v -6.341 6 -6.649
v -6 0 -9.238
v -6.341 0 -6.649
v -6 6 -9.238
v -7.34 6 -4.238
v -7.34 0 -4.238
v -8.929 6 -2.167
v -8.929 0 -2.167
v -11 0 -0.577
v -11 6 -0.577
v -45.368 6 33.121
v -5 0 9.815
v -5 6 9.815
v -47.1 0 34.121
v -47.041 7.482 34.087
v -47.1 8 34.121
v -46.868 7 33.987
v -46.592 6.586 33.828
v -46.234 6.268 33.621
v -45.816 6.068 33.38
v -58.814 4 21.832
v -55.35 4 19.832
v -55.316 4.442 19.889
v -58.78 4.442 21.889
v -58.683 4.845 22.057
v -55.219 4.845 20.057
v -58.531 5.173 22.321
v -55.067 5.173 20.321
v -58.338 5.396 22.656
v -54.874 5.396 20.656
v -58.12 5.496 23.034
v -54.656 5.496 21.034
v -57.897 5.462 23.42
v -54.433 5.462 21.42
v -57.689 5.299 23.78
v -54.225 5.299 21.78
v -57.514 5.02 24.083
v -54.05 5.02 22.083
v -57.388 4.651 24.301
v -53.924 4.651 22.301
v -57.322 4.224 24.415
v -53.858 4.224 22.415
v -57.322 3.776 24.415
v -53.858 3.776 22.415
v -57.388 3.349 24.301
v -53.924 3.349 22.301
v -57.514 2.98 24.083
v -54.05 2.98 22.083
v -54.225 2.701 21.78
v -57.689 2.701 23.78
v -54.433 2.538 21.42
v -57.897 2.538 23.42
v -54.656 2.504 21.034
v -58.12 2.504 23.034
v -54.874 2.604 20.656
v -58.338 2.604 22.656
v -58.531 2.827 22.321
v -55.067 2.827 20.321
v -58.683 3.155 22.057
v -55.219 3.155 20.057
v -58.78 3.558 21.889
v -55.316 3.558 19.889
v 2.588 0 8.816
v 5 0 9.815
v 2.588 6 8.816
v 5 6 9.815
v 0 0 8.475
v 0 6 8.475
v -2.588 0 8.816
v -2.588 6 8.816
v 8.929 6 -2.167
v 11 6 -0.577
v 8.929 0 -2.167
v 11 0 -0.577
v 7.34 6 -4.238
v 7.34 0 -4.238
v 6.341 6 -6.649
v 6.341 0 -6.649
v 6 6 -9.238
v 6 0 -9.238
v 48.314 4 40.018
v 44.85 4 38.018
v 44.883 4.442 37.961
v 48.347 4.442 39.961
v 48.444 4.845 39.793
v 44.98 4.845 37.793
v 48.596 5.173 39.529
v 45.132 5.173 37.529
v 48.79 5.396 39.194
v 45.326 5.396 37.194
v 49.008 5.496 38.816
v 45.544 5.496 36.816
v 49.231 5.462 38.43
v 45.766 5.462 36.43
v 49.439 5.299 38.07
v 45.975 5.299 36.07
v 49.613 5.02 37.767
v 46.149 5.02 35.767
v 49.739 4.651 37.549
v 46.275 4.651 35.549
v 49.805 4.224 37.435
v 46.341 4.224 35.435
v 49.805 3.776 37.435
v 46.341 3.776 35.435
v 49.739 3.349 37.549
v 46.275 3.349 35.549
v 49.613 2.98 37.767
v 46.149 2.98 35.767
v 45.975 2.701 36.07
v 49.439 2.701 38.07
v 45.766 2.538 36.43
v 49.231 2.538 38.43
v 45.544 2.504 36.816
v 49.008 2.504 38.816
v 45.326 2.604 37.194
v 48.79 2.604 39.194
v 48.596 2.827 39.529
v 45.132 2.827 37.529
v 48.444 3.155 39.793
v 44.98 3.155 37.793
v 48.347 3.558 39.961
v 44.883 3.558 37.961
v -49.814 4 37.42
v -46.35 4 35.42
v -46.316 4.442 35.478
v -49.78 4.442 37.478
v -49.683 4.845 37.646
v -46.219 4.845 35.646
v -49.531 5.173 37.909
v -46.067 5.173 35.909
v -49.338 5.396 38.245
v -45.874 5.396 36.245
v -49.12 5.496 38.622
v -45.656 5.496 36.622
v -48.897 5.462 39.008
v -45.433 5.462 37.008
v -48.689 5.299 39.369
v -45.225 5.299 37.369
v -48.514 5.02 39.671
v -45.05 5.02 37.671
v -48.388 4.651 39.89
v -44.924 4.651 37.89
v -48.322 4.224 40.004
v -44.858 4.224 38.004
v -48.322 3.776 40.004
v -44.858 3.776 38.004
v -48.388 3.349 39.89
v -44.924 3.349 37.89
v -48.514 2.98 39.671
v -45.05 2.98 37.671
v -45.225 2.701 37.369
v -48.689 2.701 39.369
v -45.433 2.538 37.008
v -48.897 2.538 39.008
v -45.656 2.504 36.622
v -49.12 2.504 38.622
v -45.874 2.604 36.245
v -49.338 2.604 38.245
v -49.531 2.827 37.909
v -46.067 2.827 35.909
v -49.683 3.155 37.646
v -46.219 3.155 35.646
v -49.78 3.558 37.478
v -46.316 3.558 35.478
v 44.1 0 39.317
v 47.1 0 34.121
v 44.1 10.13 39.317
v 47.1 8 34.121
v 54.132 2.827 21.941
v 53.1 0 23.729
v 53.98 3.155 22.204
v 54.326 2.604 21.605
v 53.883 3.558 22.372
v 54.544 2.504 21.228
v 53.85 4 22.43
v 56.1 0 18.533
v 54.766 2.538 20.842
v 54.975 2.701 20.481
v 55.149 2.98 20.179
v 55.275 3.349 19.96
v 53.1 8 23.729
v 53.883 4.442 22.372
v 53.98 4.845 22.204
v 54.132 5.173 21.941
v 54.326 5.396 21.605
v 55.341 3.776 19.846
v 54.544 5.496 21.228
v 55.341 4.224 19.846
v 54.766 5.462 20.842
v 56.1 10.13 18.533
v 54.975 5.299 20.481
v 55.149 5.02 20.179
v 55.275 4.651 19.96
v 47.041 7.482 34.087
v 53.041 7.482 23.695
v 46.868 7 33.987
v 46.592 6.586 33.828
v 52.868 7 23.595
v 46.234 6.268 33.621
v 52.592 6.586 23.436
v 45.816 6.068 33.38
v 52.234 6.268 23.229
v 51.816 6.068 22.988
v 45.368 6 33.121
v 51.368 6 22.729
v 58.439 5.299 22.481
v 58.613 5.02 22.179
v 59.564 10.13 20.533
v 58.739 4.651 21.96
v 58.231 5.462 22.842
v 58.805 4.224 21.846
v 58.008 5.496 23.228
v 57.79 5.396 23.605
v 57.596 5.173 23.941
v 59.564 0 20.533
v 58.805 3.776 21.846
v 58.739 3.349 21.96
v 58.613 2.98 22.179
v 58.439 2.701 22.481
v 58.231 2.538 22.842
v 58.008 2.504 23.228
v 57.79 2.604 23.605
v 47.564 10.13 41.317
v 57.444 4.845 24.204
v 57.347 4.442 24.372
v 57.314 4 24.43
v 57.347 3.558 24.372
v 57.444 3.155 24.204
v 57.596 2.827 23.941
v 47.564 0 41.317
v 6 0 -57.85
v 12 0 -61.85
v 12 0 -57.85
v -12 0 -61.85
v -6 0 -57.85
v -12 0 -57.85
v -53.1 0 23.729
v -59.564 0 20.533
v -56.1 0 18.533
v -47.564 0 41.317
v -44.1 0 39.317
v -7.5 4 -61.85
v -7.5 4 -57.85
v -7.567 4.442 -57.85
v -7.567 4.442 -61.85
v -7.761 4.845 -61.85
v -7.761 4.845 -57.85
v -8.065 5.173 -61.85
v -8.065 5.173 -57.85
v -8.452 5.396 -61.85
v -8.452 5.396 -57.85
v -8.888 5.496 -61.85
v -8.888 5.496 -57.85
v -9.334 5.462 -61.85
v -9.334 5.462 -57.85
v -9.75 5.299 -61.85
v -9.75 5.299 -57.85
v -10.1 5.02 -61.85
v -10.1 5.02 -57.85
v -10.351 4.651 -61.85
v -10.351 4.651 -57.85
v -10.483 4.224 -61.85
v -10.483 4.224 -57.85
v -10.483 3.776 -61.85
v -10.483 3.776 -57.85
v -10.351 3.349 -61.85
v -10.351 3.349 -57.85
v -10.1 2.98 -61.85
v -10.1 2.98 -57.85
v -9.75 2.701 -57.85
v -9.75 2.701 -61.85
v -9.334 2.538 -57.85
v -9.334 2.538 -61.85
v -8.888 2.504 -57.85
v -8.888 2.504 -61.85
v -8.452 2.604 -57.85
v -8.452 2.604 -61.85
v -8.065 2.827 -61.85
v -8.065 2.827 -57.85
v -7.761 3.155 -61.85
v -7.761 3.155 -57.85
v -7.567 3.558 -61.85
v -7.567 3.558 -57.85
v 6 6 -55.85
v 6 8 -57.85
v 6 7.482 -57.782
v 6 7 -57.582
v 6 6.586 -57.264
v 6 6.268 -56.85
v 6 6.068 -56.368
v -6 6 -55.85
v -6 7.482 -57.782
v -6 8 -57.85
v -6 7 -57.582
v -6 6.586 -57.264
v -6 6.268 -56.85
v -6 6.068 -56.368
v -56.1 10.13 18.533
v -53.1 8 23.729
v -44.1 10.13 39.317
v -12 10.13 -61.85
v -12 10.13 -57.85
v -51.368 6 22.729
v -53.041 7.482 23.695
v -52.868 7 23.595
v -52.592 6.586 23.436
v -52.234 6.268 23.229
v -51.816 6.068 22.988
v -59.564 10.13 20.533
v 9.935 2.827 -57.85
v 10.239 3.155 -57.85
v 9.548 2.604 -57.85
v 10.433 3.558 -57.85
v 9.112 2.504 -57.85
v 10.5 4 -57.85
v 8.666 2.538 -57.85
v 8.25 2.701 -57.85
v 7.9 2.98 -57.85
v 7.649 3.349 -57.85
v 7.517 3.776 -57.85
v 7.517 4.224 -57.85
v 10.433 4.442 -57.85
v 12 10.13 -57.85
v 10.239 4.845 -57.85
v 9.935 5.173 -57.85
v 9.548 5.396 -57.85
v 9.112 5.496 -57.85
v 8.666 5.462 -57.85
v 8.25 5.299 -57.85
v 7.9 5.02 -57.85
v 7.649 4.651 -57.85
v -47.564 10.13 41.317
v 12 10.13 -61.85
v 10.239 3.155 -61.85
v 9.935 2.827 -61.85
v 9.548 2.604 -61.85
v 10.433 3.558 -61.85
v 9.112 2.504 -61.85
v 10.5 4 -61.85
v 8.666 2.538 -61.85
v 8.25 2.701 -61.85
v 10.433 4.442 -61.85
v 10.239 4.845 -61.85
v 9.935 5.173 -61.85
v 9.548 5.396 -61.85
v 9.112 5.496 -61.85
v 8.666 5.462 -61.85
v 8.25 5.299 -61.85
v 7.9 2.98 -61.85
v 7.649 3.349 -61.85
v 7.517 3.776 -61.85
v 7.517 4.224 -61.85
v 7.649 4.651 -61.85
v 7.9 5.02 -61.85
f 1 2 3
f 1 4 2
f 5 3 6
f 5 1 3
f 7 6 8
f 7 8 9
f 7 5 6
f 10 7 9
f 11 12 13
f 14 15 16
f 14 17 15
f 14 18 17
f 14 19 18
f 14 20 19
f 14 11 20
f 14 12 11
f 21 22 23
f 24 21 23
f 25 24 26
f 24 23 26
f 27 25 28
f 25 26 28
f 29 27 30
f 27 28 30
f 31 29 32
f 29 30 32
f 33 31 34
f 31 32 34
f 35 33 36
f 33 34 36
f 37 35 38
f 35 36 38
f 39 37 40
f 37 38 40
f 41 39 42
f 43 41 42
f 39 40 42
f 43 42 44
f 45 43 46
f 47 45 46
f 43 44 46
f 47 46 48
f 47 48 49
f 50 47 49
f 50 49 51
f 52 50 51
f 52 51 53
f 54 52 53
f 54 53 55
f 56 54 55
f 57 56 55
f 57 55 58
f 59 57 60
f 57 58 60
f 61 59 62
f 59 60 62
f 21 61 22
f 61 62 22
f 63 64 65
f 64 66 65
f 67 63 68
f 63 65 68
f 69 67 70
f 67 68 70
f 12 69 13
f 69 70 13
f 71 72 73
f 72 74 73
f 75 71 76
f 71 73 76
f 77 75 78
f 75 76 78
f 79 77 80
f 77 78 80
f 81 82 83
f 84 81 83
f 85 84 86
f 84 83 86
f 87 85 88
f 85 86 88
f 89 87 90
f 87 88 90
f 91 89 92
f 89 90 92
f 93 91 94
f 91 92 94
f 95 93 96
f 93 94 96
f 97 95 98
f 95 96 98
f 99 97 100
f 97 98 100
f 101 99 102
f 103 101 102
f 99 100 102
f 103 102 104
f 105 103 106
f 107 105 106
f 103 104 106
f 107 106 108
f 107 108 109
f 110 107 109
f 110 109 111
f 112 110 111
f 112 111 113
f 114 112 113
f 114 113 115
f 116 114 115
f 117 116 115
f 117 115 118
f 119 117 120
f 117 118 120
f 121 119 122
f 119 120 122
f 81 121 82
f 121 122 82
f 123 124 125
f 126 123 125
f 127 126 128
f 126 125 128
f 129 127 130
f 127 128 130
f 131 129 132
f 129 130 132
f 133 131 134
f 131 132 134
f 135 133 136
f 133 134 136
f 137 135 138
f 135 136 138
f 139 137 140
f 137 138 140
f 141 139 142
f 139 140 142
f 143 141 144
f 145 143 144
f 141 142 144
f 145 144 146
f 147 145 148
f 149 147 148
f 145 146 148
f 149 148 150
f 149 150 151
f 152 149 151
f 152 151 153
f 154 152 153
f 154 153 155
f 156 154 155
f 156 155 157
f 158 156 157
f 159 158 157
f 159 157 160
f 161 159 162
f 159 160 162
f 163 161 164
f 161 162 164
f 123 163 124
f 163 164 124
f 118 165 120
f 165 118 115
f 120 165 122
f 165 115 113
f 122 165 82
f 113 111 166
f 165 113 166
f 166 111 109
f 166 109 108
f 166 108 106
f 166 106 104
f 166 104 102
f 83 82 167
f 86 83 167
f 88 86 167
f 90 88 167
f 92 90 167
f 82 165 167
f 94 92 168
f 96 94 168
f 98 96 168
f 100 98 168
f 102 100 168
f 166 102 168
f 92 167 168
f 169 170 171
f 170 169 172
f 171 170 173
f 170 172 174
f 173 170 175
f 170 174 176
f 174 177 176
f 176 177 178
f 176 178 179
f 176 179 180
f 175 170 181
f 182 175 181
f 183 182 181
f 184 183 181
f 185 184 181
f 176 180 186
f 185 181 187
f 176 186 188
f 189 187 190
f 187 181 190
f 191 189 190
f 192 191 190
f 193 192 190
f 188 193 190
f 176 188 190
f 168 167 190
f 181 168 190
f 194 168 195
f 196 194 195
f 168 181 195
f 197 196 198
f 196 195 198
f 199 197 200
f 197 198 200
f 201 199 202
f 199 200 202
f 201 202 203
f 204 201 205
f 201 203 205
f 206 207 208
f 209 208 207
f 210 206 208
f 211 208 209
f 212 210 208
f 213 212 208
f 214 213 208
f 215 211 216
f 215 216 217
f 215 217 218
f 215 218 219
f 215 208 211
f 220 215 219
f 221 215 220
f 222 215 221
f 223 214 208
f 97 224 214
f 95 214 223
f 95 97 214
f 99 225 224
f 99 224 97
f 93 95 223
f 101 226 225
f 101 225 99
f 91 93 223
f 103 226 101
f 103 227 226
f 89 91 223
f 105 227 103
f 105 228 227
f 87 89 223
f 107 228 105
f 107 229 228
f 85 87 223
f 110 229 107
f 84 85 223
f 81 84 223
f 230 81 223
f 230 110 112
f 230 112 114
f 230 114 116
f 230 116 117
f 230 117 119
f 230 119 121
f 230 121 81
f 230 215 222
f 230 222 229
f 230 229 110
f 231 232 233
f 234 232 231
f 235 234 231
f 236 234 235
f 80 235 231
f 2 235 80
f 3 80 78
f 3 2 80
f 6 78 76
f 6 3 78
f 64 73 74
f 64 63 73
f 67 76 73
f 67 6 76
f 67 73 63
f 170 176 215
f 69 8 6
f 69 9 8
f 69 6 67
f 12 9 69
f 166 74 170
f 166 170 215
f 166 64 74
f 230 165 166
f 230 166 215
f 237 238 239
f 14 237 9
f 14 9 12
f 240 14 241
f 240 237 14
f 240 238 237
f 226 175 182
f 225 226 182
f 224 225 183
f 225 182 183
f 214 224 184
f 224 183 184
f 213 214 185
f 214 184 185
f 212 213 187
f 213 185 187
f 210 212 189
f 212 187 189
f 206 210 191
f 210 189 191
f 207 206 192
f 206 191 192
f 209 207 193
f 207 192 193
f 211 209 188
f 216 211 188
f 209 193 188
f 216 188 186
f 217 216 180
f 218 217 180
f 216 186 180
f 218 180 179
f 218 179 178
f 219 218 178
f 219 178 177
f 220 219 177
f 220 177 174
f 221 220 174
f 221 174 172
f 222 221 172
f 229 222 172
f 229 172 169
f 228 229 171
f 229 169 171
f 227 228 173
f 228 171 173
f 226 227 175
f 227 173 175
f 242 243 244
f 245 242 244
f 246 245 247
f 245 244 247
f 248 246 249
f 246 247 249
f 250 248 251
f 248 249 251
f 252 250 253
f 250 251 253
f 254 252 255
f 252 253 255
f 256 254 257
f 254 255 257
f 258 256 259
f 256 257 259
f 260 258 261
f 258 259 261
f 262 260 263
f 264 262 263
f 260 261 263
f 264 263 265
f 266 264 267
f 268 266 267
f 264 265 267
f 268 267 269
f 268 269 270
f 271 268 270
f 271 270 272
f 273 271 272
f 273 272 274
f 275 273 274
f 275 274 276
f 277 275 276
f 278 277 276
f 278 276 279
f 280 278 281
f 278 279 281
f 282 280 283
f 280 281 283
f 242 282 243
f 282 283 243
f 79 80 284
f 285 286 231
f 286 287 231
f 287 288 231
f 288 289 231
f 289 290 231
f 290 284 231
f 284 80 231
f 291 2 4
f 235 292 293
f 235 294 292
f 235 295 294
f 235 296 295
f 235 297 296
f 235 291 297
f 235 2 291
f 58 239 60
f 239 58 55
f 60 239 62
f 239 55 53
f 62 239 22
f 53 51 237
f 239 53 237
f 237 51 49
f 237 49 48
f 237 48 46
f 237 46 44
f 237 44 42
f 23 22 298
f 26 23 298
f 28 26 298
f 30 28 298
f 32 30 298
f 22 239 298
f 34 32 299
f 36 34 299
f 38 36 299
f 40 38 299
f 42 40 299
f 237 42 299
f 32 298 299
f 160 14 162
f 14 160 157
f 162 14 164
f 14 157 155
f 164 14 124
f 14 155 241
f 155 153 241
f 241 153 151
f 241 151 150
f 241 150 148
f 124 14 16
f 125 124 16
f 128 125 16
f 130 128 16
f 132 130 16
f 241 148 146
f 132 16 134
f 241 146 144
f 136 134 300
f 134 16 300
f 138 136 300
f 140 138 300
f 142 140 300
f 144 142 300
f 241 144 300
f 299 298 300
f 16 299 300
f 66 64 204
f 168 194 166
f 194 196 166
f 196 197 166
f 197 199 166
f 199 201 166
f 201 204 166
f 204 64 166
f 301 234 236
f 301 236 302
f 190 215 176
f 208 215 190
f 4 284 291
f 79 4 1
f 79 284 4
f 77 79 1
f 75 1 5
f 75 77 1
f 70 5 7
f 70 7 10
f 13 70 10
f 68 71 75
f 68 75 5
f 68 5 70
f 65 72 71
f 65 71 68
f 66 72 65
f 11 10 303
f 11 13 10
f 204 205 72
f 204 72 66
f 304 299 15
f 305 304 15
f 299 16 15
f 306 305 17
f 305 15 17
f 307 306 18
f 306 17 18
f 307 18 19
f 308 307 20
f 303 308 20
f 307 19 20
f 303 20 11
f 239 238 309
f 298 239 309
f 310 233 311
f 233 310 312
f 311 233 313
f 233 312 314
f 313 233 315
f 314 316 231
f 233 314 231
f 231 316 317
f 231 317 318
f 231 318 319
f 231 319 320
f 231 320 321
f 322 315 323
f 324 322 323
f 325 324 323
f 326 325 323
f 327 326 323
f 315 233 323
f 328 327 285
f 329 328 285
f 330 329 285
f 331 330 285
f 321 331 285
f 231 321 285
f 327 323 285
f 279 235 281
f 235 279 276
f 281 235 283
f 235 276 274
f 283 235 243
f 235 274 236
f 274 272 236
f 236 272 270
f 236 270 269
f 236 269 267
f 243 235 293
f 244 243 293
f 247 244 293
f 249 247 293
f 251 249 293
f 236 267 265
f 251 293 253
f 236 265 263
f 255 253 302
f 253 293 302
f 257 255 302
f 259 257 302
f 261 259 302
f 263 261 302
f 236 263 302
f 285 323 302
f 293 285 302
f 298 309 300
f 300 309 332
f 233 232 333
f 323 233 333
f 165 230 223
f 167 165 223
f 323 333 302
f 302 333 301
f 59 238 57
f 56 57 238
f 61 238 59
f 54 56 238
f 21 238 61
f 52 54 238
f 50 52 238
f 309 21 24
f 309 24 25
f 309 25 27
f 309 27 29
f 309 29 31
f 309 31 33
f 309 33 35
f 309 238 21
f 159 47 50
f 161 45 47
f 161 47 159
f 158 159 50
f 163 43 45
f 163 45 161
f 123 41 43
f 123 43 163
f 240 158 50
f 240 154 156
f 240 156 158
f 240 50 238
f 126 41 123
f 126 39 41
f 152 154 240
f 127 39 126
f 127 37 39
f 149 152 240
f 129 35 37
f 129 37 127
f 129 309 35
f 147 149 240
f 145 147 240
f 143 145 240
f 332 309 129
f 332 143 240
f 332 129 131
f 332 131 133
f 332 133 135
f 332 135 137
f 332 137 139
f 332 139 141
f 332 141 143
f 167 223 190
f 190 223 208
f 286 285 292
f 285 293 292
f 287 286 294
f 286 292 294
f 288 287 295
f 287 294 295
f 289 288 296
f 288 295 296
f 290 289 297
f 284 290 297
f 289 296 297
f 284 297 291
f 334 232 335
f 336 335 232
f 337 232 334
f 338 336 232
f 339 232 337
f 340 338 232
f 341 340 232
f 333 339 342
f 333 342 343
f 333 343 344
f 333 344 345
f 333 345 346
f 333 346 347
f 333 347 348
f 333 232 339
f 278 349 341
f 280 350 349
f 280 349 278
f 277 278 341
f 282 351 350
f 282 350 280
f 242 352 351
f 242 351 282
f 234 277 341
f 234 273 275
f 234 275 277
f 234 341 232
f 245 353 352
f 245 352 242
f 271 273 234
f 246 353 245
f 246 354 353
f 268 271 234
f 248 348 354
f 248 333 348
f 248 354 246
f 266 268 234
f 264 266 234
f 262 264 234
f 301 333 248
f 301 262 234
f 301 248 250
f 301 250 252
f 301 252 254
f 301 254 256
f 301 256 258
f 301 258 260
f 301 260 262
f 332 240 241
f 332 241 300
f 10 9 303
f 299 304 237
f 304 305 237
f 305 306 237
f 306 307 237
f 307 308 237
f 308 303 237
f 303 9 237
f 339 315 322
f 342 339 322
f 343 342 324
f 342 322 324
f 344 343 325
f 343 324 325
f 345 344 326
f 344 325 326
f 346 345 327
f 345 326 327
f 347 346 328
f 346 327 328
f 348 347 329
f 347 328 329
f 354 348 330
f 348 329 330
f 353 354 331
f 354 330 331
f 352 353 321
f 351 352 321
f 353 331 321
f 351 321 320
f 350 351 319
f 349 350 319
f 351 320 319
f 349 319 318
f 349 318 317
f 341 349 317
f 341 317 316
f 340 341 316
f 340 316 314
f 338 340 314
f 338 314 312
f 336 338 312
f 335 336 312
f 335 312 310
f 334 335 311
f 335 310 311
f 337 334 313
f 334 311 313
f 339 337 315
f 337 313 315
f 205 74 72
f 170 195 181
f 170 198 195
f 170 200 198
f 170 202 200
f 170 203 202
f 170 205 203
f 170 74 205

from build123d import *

# Parameters (mm, degrees)
SKETCH_1_W                       = 12
SKETCH_1_H                       = 61.85
EXTRUDE_1_DEPTH                  = 6
SKETCH_2_W                       = 24
SKETCH_2_H                       = 10.13
EXTRUDE_2_DEPTH                  = 4
SKETCH_3_R                       = 1.5
CUT_EXTRUDE_1_DEPTH              = 4
FILLET_1_R                       = 2
PATTERN_CIRCULAR_1_COUNT         = 3
FILLET_1_OF_PATTERN_CIRCULAR_1_R = 2
FILLET_2_R                       = 10


with BuildPart() as part:
    # 草图1 → 凸台-拉伸1 (new body)
    with BuildSketch(Plane(origin=(0, 0, 0), x_dir=(1, 0, 0), z_dir=(0, 1, 0))):
        with Locations((0, 30.925)):
            Rectangle(SKETCH_1_W, SKETCH_1_H)
    extrude_1 = extrude(amount=EXTRUDE_1_DEPTH)

    # 草图2 → 凸台-拉伸2 (add)
    with BuildSketch(Plane(origin=(0, 0, -61.85), x_dir=(-1, 0, 0), z_dir=(0, 0, -1))):
        with Locations((0, 5.065)):
            Rectangle(SKETCH_2_W, SKETCH_2_H)
    extrude_2 = extrude(amount=-EXTRUDE_2_DEPTH)

    # 草图3 → 切除-拉伸1 (cut)
    with BuildSketch(Plane.XY.offset(-57.85)):
        with Locations((-9, 4)):
            Circle(SKETCH_3_R)
        with Locations((9, 4)):
            Circle(SKETCH_3_R)
    cut_extrude_1 = extrude(amount=-CUT_EXTRUDE_1_DEPTH, mode=Mode.SUBTRACT)

    # 圆角1
    fillet_1_edges = [part.edges().sort_by_distance(p)[0] for p in [
        (0, 6, -57.85),
    ]]
    fillet(fillet_1_edges, radius=FILLET_1_R)

    # 阵列(圆周)1: 凸台-拉伸1, 凸台-拉伸2, 切除-拉伸1 ×3 about axis
    pattern_circular_1_axis = Axis((0, 6.3, 0), (0, -1, 0))
    add([extrude_1.rotate(pattern_circular_1_axis, i * 360 / PATTERN_CIRCULAR_1_COUNT) for i in range(1, PATTERN_CIRCULAR_1_COUNT)])
    add([extrude_2.rotate(pattern_circular_1_axis, i * 360 / PATTERN_CIRCULAR_1_COUNT) for i in range(1, PATTERN_CIRCULAR_1_COUNT)])
    add([cut_extrude_1.rotate(pattern_circular_1_axis, i * 360 / PATTERN_CIRCULAR_1_COUNT) for i in range(1, PATTERN_CIRCULAR_1_COUNT)], mode=Mode.SUBTRACT)

    # 圆角1 of 阵列(圆周)1
    fillet_1_of_pattern_circular_1_edges = [part.edges().sort_by_distance(p)[0] for p in [
        (50.099569609, 6, 28.925),
        (-50.099569609, 6, 28.925),
    ]]
    fillet(fillet_1_of_pattern_circular_1_edges, radius=FILLET_1_OF_PATTERN_CIRCULAR_1_R)

    # 圆角2
    fillet_2_edges = [part.edges().sort_by_distance(p)[0] for p in [
        (-6, 3, -3.464101615),
        (6, 3, -3.464101615),
        (0, 3, 6.92820323),
    ]]
    fillet(fillet_2_edges, radius=FILLET_2_R)


solid = part.part
